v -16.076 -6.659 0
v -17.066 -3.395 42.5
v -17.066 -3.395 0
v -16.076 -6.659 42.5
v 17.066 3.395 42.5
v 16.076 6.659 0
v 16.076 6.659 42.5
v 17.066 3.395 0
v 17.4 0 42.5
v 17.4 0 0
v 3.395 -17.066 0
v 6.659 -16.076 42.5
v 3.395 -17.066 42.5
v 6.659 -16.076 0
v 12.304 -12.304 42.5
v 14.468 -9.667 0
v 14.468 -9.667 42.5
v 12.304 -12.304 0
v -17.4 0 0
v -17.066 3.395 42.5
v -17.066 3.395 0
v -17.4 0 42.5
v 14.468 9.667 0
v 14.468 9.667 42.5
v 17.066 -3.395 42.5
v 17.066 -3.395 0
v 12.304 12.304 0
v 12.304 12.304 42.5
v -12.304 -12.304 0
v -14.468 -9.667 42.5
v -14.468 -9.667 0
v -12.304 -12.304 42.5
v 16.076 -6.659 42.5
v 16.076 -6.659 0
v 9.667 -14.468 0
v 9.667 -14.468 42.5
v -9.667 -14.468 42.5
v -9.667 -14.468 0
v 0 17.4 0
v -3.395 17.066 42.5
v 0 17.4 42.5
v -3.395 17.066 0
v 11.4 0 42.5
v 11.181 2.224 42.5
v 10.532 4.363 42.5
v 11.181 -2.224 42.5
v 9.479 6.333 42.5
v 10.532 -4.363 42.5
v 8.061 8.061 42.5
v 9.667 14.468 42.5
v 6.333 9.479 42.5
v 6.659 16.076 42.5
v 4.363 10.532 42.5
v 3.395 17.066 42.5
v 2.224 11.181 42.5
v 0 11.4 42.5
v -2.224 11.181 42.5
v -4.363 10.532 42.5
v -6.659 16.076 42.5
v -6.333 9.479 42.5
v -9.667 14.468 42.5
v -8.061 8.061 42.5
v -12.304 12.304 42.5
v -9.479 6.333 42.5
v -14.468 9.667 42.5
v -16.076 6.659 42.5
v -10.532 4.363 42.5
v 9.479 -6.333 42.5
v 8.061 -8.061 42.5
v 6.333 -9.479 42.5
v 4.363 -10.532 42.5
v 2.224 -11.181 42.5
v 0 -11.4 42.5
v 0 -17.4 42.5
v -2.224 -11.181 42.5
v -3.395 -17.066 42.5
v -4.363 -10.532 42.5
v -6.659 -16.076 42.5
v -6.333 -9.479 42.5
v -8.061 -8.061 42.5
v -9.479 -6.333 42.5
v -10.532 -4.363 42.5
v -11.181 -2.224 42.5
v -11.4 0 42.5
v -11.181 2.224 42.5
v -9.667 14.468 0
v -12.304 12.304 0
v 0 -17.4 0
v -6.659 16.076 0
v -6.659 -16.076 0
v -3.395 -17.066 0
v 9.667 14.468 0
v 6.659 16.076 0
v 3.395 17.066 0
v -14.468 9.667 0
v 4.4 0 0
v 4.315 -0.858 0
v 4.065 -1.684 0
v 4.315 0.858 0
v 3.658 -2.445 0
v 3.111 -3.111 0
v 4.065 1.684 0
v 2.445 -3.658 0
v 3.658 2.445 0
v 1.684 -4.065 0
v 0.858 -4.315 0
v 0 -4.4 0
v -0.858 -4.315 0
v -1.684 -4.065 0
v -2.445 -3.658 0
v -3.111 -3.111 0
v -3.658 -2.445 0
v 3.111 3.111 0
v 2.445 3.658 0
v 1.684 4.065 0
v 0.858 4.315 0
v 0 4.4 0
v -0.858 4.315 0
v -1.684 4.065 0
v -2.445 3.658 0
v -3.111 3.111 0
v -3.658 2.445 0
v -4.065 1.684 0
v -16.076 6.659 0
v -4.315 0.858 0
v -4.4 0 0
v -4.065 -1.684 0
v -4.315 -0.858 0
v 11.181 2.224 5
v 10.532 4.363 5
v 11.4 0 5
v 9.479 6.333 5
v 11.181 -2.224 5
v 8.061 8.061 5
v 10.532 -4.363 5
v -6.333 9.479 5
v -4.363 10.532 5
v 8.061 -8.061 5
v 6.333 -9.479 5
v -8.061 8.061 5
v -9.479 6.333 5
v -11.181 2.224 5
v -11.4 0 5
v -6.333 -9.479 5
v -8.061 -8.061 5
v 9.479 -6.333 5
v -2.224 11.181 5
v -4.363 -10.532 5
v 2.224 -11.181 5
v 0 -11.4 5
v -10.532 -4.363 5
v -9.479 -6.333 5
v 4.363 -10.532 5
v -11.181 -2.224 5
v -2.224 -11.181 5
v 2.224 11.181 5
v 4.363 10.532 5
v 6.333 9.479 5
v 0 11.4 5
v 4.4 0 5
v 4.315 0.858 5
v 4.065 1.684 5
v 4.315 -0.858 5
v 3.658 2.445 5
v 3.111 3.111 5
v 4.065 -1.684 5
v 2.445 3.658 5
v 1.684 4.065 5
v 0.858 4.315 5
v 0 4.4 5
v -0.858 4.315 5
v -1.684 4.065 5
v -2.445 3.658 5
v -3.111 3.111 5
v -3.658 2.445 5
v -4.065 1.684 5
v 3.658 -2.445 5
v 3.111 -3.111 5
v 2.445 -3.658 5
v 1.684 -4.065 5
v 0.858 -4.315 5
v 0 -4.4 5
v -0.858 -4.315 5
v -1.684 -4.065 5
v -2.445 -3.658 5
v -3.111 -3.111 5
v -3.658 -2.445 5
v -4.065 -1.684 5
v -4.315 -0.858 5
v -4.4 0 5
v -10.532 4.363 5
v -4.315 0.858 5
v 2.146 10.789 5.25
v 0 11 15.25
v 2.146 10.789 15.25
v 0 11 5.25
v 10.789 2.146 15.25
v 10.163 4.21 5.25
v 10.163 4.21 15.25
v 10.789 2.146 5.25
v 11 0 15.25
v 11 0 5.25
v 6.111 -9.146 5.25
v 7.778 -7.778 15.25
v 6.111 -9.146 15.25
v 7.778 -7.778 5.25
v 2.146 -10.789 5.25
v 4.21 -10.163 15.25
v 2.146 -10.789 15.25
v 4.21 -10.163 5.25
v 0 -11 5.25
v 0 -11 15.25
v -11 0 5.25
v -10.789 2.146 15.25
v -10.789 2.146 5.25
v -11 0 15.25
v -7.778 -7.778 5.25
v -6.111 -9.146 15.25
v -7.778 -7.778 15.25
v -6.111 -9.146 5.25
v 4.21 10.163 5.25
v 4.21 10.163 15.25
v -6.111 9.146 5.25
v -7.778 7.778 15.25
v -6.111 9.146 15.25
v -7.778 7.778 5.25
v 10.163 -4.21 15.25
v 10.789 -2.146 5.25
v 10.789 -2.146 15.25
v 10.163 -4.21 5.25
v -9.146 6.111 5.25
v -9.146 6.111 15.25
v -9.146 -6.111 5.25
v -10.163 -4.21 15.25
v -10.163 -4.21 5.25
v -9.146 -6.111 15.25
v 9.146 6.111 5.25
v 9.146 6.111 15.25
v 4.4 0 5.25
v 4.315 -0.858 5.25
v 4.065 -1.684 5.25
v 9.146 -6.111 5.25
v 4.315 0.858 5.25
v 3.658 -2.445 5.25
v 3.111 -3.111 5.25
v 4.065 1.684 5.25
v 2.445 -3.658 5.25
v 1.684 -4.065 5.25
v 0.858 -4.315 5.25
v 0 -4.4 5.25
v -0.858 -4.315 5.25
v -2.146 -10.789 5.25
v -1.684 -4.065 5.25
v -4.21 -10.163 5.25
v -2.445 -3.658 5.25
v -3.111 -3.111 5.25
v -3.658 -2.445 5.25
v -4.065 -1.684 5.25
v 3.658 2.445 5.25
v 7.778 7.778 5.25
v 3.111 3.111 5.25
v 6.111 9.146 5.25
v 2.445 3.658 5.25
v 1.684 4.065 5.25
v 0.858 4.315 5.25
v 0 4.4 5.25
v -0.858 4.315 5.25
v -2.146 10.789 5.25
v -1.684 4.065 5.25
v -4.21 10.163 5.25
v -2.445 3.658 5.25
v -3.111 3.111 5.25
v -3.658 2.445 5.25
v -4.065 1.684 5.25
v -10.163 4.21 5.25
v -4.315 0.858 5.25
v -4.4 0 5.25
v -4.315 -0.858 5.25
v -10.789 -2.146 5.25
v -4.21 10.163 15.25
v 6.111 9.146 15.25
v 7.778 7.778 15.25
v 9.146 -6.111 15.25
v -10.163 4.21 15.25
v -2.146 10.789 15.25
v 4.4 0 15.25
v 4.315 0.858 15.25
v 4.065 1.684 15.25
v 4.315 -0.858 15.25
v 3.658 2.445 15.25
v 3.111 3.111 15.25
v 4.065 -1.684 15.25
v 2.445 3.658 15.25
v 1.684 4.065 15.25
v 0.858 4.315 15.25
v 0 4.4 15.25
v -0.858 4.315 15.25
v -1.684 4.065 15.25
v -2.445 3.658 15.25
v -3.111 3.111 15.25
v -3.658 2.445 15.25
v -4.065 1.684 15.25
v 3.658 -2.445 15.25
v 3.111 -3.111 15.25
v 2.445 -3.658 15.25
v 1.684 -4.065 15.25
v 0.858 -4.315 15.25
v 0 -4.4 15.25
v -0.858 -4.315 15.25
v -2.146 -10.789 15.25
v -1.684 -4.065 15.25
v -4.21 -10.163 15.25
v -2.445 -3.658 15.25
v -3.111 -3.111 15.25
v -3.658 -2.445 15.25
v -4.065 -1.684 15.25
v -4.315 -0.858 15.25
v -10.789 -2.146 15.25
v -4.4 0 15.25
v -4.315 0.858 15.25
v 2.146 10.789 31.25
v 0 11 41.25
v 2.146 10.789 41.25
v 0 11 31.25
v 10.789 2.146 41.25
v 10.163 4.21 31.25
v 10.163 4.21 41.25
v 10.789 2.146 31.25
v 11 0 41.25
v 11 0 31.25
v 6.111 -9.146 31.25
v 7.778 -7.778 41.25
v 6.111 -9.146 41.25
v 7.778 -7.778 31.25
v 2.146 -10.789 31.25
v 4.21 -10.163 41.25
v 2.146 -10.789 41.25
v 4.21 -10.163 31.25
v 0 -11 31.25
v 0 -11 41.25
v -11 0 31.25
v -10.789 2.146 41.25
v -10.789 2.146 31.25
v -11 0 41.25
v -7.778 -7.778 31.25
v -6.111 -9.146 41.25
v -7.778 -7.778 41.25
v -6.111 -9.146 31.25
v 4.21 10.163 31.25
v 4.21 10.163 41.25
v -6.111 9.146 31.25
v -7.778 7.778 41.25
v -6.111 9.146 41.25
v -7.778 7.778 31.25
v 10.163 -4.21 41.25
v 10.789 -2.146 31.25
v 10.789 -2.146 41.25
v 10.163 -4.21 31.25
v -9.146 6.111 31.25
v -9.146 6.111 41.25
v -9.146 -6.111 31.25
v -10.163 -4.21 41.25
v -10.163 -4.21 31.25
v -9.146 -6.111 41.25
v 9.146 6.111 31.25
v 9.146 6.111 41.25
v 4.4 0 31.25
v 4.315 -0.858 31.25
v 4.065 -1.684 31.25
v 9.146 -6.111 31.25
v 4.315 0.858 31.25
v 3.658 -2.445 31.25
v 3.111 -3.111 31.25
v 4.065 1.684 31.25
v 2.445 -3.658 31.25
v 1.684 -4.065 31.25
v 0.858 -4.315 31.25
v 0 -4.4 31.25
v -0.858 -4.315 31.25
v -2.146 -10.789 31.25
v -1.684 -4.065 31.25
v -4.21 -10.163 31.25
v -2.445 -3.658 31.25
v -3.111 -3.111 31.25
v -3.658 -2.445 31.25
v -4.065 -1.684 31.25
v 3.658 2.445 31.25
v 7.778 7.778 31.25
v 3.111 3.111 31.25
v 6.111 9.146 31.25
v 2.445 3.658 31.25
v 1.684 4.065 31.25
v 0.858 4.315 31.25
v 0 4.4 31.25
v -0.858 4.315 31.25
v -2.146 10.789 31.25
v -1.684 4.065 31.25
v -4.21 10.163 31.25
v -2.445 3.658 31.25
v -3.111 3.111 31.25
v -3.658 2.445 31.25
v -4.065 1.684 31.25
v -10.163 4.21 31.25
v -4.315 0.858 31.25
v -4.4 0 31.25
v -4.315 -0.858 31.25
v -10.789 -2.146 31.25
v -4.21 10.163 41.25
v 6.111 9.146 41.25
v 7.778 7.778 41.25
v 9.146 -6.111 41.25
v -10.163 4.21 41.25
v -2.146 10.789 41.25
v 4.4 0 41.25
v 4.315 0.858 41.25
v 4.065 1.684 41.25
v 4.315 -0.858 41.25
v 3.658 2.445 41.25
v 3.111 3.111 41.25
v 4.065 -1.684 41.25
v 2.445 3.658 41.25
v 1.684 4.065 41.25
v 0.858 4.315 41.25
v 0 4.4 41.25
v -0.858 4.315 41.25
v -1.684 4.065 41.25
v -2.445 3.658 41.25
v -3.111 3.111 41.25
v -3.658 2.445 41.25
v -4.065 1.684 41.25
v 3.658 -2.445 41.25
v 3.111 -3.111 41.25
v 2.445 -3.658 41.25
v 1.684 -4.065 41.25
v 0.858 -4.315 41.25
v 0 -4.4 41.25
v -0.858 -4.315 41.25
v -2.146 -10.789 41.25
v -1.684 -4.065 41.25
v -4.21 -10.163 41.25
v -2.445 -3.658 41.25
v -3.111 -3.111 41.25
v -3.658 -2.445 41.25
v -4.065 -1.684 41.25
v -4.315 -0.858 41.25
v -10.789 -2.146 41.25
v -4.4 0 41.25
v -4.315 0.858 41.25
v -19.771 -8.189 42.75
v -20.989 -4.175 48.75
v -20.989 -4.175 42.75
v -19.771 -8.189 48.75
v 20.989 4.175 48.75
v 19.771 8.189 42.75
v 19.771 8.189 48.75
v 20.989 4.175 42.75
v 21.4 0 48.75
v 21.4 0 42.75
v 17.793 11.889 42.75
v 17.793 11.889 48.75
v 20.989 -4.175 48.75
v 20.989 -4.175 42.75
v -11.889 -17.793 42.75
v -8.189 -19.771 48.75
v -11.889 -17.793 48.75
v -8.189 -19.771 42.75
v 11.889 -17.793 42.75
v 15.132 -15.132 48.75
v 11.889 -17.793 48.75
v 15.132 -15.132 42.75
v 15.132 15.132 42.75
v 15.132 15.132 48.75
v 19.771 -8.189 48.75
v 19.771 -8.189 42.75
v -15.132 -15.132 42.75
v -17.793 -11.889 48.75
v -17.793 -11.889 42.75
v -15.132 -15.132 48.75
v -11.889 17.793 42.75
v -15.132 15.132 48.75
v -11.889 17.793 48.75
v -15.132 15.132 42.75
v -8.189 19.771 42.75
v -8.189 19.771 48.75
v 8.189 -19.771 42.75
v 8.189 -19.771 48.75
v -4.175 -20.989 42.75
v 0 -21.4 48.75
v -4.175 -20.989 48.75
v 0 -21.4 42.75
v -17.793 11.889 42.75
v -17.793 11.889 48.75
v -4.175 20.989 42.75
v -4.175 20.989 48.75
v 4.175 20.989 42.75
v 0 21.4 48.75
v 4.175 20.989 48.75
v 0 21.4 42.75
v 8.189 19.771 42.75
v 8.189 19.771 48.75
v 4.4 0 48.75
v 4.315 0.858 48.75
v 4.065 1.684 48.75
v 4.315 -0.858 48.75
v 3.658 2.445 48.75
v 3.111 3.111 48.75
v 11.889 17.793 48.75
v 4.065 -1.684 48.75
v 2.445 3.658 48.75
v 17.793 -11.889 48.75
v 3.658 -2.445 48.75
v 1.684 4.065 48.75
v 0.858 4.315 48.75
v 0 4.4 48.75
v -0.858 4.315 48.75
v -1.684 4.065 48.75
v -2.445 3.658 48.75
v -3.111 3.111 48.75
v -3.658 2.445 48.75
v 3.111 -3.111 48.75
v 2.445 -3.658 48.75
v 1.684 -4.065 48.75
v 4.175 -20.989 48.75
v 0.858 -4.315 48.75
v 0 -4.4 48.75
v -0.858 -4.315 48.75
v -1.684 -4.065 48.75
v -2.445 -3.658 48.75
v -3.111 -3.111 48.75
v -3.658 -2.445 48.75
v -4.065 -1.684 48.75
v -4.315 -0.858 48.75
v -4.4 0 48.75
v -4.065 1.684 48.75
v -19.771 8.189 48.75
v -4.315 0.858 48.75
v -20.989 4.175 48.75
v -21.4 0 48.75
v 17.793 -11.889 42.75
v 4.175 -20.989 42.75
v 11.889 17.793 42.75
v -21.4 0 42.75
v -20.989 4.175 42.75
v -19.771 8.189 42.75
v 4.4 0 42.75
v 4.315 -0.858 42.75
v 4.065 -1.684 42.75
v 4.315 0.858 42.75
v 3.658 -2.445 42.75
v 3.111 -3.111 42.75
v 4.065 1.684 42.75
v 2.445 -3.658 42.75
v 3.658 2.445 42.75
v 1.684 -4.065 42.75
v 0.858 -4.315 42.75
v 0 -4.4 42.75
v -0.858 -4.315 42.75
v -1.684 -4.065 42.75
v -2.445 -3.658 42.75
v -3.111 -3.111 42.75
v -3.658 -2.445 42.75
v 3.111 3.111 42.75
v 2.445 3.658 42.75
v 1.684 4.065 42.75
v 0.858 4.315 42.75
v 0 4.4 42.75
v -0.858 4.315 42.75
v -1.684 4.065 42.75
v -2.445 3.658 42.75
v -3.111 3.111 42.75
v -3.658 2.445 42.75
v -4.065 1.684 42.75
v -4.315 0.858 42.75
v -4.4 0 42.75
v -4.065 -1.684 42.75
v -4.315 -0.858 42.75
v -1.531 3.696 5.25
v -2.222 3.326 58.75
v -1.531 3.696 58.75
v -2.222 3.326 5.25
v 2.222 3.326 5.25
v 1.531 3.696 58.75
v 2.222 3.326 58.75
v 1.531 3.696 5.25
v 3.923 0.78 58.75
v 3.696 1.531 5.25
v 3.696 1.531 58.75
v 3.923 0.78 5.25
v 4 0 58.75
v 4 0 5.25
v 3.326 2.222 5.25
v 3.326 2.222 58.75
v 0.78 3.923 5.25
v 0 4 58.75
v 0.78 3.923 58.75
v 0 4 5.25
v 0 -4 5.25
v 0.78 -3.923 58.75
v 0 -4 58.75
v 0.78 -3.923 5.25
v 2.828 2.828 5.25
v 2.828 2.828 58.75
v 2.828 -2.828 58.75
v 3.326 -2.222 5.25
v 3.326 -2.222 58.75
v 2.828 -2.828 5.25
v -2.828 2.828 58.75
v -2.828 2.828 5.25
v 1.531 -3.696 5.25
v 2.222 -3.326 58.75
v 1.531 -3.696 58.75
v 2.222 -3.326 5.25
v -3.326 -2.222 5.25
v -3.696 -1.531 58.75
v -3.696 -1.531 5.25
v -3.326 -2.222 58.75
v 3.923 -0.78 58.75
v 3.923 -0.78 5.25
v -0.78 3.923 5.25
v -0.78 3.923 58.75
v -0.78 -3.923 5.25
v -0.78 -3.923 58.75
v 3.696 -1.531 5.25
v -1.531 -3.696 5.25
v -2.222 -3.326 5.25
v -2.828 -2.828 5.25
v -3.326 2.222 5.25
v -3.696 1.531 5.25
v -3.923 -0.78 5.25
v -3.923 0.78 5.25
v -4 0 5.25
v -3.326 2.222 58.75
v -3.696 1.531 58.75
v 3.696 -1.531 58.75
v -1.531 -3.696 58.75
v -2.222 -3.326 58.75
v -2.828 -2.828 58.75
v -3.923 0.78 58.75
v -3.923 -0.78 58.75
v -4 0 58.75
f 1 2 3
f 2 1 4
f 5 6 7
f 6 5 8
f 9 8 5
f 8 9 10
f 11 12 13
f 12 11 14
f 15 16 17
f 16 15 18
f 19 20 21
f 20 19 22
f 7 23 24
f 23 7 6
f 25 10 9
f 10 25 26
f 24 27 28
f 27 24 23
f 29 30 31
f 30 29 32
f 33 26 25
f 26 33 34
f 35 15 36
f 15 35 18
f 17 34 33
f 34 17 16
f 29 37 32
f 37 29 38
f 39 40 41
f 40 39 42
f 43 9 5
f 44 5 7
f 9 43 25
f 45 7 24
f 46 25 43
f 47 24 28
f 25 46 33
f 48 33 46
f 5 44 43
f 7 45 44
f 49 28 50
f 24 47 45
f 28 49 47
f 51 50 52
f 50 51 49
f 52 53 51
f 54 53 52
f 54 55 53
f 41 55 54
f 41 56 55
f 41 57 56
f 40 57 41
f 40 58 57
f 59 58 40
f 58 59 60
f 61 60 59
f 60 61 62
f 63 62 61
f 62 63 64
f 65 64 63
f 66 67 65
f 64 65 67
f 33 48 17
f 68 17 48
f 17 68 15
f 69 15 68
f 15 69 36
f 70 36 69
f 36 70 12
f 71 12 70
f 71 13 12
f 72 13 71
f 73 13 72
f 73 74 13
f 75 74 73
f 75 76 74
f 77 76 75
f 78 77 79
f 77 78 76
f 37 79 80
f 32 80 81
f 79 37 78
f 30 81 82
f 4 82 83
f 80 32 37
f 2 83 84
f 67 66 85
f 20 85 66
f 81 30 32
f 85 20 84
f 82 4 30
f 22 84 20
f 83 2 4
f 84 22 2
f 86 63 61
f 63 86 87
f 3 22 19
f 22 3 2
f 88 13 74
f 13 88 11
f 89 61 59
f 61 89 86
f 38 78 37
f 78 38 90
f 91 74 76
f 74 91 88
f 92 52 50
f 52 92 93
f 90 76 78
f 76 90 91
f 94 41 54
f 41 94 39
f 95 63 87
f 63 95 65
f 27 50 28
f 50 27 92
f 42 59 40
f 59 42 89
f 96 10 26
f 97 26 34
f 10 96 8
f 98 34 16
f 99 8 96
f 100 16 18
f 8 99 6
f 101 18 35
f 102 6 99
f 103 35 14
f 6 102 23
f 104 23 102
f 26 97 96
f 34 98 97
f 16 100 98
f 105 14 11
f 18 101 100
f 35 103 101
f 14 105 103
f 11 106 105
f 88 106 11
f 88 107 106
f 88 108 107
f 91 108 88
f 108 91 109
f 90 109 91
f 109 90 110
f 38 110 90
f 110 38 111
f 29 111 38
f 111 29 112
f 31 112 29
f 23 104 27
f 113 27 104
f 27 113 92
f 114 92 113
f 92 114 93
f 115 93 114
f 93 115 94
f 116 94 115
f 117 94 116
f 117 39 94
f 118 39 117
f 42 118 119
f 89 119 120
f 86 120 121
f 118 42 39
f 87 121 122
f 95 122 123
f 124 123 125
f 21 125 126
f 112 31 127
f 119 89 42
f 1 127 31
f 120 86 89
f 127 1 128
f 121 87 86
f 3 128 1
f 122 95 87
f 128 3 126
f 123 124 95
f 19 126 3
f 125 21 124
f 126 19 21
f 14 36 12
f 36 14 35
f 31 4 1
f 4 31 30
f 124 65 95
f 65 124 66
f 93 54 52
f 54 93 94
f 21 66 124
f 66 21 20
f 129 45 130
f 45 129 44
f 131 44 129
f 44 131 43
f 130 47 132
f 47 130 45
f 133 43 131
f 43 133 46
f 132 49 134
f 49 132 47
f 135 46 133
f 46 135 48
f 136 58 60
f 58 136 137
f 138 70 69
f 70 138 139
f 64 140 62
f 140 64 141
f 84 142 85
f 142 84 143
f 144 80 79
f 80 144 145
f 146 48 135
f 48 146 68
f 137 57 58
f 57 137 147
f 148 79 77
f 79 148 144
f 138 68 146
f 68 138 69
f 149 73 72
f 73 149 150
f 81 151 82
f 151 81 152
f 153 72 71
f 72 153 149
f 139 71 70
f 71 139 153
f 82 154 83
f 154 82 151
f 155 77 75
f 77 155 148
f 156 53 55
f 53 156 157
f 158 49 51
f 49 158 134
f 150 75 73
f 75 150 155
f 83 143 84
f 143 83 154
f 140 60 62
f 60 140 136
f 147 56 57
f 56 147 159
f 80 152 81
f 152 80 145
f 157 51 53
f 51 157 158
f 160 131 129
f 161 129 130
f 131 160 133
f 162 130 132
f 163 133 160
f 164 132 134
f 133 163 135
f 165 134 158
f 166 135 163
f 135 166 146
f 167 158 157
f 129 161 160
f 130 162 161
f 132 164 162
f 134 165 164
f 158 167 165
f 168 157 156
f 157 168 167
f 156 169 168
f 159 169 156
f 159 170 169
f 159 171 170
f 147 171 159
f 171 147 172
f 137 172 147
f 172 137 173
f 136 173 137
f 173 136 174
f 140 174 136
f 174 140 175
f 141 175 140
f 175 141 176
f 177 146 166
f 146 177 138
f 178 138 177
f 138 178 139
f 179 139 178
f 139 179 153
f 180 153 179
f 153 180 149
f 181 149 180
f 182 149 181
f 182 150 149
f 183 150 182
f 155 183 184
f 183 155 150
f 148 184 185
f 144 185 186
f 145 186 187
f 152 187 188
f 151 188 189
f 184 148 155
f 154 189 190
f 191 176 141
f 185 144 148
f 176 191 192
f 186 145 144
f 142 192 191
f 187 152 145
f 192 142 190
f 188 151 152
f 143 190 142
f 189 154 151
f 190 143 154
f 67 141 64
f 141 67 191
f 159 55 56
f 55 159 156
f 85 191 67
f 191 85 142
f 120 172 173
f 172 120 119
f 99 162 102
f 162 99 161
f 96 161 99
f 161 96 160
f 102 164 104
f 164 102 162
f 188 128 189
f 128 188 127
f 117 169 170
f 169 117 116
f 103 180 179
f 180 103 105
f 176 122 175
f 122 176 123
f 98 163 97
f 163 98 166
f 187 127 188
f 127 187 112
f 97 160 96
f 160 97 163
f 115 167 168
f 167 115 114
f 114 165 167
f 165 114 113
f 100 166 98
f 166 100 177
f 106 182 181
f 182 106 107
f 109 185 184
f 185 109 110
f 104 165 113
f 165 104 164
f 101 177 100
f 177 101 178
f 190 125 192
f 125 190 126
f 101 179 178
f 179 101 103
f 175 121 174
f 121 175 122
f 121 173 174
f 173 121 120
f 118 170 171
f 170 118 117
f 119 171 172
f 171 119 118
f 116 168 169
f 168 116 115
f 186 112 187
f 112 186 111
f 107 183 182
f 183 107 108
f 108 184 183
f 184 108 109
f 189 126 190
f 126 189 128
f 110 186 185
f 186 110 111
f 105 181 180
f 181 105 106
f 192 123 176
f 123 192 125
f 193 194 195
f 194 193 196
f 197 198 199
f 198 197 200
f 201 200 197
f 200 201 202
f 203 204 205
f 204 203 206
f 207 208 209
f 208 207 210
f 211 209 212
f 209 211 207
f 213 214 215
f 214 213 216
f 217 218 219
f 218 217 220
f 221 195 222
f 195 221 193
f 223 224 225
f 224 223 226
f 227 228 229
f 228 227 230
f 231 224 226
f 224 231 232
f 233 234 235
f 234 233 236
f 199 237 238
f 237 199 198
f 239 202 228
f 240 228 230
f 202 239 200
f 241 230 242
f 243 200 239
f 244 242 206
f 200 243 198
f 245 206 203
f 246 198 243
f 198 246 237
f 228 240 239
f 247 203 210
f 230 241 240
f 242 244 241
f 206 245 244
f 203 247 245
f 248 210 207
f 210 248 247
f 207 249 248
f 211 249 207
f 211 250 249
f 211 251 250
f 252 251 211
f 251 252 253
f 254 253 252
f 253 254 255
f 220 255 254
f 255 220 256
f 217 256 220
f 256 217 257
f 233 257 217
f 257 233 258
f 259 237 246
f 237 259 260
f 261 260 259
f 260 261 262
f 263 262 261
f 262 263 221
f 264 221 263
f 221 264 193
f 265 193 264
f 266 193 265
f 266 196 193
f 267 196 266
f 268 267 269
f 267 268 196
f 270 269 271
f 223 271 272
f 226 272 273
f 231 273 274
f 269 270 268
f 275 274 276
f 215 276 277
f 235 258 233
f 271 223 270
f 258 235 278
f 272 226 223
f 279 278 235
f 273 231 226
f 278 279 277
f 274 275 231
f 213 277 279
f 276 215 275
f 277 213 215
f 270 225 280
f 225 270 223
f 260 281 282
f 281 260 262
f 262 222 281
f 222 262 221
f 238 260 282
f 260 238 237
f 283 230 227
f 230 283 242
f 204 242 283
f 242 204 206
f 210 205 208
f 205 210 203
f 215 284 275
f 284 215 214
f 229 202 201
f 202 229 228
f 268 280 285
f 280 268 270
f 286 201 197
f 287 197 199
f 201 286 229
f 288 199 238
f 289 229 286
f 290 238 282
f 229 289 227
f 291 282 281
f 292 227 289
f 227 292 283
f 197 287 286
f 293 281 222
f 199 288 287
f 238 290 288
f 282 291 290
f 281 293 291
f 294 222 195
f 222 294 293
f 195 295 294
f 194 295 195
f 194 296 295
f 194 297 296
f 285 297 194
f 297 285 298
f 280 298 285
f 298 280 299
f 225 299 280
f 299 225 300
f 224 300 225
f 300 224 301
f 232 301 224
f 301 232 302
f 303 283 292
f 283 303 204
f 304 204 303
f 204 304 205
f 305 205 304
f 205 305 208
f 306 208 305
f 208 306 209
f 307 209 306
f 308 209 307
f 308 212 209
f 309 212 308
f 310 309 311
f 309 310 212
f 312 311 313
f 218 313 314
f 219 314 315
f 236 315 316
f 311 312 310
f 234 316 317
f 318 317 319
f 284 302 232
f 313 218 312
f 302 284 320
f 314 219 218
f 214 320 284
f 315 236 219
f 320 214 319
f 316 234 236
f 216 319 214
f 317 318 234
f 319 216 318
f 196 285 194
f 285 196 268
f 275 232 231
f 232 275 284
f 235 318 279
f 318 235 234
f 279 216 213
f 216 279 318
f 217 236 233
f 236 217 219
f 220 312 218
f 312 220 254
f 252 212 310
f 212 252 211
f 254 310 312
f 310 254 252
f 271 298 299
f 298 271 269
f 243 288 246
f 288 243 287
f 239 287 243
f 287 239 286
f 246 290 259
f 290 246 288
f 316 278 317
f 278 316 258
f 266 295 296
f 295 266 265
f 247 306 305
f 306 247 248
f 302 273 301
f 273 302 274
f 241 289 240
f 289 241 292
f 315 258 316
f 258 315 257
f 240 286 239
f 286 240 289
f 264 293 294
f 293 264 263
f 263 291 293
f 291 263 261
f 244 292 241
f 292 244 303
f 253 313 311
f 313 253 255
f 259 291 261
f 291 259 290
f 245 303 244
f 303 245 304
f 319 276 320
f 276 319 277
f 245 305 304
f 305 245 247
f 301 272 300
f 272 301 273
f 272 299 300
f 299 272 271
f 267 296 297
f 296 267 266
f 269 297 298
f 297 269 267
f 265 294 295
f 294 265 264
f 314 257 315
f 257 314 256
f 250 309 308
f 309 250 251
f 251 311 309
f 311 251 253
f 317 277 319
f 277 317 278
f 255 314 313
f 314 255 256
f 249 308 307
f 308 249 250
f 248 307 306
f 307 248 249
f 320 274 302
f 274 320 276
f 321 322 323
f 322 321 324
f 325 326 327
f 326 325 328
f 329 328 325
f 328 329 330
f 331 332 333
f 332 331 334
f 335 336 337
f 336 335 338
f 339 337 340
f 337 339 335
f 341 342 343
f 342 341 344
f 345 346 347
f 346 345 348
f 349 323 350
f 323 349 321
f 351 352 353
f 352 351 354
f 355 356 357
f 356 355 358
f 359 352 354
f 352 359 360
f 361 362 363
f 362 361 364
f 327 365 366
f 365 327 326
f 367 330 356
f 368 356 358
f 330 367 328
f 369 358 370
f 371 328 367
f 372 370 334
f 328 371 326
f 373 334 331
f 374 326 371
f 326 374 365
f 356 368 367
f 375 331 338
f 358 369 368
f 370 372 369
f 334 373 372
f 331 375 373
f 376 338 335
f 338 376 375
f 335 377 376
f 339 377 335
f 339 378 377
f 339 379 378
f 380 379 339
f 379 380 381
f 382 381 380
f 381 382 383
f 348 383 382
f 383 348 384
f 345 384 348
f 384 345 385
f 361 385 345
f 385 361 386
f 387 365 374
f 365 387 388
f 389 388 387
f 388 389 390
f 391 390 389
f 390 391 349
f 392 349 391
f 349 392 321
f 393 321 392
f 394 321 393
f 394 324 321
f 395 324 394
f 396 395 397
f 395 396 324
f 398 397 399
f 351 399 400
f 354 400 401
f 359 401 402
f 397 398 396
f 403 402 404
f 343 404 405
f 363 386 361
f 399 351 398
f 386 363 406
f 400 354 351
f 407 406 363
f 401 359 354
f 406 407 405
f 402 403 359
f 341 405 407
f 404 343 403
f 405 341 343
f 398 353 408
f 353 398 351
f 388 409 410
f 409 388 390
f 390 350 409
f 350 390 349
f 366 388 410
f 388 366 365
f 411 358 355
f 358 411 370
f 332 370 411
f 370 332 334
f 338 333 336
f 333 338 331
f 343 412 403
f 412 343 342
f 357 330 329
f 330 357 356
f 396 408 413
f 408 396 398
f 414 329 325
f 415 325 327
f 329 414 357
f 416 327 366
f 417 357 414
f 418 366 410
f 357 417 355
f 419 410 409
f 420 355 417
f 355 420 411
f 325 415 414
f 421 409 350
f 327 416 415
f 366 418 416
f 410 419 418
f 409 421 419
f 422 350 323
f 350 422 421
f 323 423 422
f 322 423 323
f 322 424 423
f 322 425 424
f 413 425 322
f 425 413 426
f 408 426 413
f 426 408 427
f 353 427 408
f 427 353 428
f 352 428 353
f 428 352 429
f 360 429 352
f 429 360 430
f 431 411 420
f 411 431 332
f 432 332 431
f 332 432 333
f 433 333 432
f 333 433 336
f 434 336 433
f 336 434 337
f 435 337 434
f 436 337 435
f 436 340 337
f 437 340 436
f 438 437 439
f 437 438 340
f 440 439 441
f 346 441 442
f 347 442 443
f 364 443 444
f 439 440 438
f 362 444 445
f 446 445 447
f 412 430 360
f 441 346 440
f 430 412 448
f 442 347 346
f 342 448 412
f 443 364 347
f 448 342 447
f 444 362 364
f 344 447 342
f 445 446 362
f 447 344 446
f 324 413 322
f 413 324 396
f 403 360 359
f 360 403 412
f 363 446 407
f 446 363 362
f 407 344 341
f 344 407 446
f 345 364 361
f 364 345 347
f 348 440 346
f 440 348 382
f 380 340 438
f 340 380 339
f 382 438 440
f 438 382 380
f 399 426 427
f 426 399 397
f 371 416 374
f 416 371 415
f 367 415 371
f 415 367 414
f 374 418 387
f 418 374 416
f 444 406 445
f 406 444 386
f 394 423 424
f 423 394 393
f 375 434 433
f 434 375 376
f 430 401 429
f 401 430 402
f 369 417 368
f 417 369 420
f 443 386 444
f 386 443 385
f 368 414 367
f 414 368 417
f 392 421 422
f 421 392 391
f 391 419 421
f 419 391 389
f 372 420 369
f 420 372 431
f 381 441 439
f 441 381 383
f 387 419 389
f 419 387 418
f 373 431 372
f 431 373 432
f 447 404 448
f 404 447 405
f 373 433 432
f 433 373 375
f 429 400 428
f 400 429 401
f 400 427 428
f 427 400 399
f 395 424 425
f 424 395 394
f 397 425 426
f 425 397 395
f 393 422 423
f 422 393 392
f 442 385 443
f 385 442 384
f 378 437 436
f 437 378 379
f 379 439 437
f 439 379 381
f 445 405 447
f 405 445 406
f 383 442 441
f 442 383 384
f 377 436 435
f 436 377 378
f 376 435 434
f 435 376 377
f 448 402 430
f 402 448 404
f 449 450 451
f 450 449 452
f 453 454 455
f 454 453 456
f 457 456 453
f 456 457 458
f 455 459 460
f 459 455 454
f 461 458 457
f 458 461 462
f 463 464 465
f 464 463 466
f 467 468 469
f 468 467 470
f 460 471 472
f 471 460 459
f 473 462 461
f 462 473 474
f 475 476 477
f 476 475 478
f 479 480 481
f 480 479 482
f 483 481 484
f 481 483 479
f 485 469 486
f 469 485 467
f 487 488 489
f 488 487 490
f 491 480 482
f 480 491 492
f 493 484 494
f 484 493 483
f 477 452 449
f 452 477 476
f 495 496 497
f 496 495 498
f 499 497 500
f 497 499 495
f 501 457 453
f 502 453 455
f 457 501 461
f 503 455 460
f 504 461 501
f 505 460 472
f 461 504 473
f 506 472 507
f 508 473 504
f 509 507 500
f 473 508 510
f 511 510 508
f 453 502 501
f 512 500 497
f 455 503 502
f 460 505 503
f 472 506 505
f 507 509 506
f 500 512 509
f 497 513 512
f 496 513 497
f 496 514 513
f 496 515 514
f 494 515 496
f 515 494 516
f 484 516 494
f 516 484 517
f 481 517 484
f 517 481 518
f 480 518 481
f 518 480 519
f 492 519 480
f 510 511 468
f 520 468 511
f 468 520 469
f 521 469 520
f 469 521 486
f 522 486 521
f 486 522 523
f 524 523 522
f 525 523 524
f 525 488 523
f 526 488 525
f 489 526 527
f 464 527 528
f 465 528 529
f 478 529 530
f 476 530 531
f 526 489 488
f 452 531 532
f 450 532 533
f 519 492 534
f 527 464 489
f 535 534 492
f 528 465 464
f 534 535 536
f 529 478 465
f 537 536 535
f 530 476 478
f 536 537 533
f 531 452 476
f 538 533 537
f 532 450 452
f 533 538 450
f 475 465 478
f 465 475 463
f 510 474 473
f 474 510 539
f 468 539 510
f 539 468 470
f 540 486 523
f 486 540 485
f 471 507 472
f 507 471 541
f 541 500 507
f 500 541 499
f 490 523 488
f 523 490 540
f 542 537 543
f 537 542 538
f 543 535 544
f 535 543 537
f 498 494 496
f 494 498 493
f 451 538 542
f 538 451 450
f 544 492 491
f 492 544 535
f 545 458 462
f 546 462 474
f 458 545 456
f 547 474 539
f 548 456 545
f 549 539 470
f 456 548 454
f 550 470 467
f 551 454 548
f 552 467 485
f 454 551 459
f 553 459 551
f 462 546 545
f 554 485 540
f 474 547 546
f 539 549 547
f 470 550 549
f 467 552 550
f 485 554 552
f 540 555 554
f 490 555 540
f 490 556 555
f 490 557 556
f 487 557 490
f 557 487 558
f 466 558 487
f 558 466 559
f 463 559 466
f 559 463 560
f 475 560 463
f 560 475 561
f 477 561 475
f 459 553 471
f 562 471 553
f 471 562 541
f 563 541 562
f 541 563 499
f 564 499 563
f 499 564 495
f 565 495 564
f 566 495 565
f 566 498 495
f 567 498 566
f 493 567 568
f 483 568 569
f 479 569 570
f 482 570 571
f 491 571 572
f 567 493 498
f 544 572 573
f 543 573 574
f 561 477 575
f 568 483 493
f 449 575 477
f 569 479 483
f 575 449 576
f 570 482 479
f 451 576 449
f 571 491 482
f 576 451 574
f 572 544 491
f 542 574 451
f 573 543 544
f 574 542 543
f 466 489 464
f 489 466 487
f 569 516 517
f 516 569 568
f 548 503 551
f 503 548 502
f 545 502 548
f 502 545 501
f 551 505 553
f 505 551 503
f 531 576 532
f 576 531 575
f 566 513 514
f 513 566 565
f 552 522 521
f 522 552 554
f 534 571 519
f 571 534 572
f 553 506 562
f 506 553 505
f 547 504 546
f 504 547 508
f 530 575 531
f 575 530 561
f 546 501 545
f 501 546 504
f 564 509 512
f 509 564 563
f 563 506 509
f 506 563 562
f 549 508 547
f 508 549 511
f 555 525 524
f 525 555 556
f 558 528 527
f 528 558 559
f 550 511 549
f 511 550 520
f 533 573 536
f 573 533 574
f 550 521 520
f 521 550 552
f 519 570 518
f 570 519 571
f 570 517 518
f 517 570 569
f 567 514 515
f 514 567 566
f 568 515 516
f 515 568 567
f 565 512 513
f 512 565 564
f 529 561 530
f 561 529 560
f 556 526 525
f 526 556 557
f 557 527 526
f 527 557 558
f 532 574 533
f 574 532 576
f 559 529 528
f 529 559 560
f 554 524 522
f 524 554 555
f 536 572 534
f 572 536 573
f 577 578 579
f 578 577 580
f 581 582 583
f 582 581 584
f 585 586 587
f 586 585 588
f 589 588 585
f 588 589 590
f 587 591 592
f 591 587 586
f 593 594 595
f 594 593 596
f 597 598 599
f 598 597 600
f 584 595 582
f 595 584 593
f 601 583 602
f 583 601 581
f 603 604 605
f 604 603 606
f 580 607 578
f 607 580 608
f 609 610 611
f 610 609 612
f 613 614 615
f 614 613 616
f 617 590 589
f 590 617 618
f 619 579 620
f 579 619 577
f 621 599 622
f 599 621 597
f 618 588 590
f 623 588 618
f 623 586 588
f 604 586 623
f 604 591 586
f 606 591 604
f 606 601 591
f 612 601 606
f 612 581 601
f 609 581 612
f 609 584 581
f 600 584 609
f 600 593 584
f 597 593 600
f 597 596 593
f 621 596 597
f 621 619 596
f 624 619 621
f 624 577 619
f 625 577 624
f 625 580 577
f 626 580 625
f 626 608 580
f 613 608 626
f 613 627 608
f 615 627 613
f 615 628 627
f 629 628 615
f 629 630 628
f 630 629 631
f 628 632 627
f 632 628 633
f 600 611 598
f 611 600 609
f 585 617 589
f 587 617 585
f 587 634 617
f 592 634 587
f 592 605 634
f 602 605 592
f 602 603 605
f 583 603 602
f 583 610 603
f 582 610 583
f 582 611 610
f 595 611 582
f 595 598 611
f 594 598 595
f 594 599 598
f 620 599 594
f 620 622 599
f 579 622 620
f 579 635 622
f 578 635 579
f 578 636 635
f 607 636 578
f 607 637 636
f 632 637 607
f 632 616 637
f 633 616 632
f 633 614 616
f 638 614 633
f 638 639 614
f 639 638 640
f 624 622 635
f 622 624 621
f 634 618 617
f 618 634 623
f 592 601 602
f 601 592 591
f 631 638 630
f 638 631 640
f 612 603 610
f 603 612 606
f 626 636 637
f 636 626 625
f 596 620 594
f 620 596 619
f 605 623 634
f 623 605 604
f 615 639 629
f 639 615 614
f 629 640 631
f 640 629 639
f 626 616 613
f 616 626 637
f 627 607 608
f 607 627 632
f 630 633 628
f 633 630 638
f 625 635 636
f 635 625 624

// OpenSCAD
$fn = 32;

// ------------------------------------------------------------------------
// Shaft station: cup d34.8 x 42.5 mm, shaft d8
// Every part is its own module, assembly() places every instance.
// ------------------------------------------------------------------------

// --- part 1 ---
module housing_cup() {
  difference() {
    cylinder(h = 42.5, d = 34.8);
    translate([0, 0, 5]) cylinder(h = 38.5, d = 22.8);
    translate([0, 0, -1]) cylinder(h = 7, d = 8.8);
  }
}

// --- part 2 ---
module bearing_lower() {
  difference() {
      translate([0, 0, 0]) cylinder(h = 10, d = 22);
      translate([0, 0, -1]) cylinder(h = 12, d = 8.8);
    }
}

// --- part 3 ---
module bearing_upper() {
  difference() {
      translate([0, 0, 0]) cylinder(h = 10, d = 22);
      translate([0, 0, -1]) cylinder(h = 12, d = 8.8);
    }
}

// --- part 4 ---
module station_shaft() {
  translate([0, 0, -26.75]) cylinder(h = 53.5, d = 8);
}

// --- part 5 ---
module station_cover() {
  difference() {
    cylinder(h = 6, d = 42.8);
    translate([0, 0, -1]) cylinder(h = 8, d = 8.8);
  }
}

// --- assembly ---
module assembly() {
  color([0.80, 0.24, 0.20]) translate([0, 0, 0]) rotate([0, 0, 0]) housing_cup();
  color([0.20, 0.45, 0.75]) translate([0, 0, 5.25]) rotate([0, 0, 0]) bearing_lower();
  color([0.25, 0.62, 0.32]) translate([0, 0, 31.25]) rotate([0, 0, 0]) bearing_upper();
  color([0.92, 0.70, 0.18]) translate([0, 0, 32]) rotate([0, 0, 0]) station_shaft();
  color([0.58, 0.35, 0.70]) translate([0, 0, 42.75]) rotate([0, 0, 0]) station_cover();
}

assembly();
